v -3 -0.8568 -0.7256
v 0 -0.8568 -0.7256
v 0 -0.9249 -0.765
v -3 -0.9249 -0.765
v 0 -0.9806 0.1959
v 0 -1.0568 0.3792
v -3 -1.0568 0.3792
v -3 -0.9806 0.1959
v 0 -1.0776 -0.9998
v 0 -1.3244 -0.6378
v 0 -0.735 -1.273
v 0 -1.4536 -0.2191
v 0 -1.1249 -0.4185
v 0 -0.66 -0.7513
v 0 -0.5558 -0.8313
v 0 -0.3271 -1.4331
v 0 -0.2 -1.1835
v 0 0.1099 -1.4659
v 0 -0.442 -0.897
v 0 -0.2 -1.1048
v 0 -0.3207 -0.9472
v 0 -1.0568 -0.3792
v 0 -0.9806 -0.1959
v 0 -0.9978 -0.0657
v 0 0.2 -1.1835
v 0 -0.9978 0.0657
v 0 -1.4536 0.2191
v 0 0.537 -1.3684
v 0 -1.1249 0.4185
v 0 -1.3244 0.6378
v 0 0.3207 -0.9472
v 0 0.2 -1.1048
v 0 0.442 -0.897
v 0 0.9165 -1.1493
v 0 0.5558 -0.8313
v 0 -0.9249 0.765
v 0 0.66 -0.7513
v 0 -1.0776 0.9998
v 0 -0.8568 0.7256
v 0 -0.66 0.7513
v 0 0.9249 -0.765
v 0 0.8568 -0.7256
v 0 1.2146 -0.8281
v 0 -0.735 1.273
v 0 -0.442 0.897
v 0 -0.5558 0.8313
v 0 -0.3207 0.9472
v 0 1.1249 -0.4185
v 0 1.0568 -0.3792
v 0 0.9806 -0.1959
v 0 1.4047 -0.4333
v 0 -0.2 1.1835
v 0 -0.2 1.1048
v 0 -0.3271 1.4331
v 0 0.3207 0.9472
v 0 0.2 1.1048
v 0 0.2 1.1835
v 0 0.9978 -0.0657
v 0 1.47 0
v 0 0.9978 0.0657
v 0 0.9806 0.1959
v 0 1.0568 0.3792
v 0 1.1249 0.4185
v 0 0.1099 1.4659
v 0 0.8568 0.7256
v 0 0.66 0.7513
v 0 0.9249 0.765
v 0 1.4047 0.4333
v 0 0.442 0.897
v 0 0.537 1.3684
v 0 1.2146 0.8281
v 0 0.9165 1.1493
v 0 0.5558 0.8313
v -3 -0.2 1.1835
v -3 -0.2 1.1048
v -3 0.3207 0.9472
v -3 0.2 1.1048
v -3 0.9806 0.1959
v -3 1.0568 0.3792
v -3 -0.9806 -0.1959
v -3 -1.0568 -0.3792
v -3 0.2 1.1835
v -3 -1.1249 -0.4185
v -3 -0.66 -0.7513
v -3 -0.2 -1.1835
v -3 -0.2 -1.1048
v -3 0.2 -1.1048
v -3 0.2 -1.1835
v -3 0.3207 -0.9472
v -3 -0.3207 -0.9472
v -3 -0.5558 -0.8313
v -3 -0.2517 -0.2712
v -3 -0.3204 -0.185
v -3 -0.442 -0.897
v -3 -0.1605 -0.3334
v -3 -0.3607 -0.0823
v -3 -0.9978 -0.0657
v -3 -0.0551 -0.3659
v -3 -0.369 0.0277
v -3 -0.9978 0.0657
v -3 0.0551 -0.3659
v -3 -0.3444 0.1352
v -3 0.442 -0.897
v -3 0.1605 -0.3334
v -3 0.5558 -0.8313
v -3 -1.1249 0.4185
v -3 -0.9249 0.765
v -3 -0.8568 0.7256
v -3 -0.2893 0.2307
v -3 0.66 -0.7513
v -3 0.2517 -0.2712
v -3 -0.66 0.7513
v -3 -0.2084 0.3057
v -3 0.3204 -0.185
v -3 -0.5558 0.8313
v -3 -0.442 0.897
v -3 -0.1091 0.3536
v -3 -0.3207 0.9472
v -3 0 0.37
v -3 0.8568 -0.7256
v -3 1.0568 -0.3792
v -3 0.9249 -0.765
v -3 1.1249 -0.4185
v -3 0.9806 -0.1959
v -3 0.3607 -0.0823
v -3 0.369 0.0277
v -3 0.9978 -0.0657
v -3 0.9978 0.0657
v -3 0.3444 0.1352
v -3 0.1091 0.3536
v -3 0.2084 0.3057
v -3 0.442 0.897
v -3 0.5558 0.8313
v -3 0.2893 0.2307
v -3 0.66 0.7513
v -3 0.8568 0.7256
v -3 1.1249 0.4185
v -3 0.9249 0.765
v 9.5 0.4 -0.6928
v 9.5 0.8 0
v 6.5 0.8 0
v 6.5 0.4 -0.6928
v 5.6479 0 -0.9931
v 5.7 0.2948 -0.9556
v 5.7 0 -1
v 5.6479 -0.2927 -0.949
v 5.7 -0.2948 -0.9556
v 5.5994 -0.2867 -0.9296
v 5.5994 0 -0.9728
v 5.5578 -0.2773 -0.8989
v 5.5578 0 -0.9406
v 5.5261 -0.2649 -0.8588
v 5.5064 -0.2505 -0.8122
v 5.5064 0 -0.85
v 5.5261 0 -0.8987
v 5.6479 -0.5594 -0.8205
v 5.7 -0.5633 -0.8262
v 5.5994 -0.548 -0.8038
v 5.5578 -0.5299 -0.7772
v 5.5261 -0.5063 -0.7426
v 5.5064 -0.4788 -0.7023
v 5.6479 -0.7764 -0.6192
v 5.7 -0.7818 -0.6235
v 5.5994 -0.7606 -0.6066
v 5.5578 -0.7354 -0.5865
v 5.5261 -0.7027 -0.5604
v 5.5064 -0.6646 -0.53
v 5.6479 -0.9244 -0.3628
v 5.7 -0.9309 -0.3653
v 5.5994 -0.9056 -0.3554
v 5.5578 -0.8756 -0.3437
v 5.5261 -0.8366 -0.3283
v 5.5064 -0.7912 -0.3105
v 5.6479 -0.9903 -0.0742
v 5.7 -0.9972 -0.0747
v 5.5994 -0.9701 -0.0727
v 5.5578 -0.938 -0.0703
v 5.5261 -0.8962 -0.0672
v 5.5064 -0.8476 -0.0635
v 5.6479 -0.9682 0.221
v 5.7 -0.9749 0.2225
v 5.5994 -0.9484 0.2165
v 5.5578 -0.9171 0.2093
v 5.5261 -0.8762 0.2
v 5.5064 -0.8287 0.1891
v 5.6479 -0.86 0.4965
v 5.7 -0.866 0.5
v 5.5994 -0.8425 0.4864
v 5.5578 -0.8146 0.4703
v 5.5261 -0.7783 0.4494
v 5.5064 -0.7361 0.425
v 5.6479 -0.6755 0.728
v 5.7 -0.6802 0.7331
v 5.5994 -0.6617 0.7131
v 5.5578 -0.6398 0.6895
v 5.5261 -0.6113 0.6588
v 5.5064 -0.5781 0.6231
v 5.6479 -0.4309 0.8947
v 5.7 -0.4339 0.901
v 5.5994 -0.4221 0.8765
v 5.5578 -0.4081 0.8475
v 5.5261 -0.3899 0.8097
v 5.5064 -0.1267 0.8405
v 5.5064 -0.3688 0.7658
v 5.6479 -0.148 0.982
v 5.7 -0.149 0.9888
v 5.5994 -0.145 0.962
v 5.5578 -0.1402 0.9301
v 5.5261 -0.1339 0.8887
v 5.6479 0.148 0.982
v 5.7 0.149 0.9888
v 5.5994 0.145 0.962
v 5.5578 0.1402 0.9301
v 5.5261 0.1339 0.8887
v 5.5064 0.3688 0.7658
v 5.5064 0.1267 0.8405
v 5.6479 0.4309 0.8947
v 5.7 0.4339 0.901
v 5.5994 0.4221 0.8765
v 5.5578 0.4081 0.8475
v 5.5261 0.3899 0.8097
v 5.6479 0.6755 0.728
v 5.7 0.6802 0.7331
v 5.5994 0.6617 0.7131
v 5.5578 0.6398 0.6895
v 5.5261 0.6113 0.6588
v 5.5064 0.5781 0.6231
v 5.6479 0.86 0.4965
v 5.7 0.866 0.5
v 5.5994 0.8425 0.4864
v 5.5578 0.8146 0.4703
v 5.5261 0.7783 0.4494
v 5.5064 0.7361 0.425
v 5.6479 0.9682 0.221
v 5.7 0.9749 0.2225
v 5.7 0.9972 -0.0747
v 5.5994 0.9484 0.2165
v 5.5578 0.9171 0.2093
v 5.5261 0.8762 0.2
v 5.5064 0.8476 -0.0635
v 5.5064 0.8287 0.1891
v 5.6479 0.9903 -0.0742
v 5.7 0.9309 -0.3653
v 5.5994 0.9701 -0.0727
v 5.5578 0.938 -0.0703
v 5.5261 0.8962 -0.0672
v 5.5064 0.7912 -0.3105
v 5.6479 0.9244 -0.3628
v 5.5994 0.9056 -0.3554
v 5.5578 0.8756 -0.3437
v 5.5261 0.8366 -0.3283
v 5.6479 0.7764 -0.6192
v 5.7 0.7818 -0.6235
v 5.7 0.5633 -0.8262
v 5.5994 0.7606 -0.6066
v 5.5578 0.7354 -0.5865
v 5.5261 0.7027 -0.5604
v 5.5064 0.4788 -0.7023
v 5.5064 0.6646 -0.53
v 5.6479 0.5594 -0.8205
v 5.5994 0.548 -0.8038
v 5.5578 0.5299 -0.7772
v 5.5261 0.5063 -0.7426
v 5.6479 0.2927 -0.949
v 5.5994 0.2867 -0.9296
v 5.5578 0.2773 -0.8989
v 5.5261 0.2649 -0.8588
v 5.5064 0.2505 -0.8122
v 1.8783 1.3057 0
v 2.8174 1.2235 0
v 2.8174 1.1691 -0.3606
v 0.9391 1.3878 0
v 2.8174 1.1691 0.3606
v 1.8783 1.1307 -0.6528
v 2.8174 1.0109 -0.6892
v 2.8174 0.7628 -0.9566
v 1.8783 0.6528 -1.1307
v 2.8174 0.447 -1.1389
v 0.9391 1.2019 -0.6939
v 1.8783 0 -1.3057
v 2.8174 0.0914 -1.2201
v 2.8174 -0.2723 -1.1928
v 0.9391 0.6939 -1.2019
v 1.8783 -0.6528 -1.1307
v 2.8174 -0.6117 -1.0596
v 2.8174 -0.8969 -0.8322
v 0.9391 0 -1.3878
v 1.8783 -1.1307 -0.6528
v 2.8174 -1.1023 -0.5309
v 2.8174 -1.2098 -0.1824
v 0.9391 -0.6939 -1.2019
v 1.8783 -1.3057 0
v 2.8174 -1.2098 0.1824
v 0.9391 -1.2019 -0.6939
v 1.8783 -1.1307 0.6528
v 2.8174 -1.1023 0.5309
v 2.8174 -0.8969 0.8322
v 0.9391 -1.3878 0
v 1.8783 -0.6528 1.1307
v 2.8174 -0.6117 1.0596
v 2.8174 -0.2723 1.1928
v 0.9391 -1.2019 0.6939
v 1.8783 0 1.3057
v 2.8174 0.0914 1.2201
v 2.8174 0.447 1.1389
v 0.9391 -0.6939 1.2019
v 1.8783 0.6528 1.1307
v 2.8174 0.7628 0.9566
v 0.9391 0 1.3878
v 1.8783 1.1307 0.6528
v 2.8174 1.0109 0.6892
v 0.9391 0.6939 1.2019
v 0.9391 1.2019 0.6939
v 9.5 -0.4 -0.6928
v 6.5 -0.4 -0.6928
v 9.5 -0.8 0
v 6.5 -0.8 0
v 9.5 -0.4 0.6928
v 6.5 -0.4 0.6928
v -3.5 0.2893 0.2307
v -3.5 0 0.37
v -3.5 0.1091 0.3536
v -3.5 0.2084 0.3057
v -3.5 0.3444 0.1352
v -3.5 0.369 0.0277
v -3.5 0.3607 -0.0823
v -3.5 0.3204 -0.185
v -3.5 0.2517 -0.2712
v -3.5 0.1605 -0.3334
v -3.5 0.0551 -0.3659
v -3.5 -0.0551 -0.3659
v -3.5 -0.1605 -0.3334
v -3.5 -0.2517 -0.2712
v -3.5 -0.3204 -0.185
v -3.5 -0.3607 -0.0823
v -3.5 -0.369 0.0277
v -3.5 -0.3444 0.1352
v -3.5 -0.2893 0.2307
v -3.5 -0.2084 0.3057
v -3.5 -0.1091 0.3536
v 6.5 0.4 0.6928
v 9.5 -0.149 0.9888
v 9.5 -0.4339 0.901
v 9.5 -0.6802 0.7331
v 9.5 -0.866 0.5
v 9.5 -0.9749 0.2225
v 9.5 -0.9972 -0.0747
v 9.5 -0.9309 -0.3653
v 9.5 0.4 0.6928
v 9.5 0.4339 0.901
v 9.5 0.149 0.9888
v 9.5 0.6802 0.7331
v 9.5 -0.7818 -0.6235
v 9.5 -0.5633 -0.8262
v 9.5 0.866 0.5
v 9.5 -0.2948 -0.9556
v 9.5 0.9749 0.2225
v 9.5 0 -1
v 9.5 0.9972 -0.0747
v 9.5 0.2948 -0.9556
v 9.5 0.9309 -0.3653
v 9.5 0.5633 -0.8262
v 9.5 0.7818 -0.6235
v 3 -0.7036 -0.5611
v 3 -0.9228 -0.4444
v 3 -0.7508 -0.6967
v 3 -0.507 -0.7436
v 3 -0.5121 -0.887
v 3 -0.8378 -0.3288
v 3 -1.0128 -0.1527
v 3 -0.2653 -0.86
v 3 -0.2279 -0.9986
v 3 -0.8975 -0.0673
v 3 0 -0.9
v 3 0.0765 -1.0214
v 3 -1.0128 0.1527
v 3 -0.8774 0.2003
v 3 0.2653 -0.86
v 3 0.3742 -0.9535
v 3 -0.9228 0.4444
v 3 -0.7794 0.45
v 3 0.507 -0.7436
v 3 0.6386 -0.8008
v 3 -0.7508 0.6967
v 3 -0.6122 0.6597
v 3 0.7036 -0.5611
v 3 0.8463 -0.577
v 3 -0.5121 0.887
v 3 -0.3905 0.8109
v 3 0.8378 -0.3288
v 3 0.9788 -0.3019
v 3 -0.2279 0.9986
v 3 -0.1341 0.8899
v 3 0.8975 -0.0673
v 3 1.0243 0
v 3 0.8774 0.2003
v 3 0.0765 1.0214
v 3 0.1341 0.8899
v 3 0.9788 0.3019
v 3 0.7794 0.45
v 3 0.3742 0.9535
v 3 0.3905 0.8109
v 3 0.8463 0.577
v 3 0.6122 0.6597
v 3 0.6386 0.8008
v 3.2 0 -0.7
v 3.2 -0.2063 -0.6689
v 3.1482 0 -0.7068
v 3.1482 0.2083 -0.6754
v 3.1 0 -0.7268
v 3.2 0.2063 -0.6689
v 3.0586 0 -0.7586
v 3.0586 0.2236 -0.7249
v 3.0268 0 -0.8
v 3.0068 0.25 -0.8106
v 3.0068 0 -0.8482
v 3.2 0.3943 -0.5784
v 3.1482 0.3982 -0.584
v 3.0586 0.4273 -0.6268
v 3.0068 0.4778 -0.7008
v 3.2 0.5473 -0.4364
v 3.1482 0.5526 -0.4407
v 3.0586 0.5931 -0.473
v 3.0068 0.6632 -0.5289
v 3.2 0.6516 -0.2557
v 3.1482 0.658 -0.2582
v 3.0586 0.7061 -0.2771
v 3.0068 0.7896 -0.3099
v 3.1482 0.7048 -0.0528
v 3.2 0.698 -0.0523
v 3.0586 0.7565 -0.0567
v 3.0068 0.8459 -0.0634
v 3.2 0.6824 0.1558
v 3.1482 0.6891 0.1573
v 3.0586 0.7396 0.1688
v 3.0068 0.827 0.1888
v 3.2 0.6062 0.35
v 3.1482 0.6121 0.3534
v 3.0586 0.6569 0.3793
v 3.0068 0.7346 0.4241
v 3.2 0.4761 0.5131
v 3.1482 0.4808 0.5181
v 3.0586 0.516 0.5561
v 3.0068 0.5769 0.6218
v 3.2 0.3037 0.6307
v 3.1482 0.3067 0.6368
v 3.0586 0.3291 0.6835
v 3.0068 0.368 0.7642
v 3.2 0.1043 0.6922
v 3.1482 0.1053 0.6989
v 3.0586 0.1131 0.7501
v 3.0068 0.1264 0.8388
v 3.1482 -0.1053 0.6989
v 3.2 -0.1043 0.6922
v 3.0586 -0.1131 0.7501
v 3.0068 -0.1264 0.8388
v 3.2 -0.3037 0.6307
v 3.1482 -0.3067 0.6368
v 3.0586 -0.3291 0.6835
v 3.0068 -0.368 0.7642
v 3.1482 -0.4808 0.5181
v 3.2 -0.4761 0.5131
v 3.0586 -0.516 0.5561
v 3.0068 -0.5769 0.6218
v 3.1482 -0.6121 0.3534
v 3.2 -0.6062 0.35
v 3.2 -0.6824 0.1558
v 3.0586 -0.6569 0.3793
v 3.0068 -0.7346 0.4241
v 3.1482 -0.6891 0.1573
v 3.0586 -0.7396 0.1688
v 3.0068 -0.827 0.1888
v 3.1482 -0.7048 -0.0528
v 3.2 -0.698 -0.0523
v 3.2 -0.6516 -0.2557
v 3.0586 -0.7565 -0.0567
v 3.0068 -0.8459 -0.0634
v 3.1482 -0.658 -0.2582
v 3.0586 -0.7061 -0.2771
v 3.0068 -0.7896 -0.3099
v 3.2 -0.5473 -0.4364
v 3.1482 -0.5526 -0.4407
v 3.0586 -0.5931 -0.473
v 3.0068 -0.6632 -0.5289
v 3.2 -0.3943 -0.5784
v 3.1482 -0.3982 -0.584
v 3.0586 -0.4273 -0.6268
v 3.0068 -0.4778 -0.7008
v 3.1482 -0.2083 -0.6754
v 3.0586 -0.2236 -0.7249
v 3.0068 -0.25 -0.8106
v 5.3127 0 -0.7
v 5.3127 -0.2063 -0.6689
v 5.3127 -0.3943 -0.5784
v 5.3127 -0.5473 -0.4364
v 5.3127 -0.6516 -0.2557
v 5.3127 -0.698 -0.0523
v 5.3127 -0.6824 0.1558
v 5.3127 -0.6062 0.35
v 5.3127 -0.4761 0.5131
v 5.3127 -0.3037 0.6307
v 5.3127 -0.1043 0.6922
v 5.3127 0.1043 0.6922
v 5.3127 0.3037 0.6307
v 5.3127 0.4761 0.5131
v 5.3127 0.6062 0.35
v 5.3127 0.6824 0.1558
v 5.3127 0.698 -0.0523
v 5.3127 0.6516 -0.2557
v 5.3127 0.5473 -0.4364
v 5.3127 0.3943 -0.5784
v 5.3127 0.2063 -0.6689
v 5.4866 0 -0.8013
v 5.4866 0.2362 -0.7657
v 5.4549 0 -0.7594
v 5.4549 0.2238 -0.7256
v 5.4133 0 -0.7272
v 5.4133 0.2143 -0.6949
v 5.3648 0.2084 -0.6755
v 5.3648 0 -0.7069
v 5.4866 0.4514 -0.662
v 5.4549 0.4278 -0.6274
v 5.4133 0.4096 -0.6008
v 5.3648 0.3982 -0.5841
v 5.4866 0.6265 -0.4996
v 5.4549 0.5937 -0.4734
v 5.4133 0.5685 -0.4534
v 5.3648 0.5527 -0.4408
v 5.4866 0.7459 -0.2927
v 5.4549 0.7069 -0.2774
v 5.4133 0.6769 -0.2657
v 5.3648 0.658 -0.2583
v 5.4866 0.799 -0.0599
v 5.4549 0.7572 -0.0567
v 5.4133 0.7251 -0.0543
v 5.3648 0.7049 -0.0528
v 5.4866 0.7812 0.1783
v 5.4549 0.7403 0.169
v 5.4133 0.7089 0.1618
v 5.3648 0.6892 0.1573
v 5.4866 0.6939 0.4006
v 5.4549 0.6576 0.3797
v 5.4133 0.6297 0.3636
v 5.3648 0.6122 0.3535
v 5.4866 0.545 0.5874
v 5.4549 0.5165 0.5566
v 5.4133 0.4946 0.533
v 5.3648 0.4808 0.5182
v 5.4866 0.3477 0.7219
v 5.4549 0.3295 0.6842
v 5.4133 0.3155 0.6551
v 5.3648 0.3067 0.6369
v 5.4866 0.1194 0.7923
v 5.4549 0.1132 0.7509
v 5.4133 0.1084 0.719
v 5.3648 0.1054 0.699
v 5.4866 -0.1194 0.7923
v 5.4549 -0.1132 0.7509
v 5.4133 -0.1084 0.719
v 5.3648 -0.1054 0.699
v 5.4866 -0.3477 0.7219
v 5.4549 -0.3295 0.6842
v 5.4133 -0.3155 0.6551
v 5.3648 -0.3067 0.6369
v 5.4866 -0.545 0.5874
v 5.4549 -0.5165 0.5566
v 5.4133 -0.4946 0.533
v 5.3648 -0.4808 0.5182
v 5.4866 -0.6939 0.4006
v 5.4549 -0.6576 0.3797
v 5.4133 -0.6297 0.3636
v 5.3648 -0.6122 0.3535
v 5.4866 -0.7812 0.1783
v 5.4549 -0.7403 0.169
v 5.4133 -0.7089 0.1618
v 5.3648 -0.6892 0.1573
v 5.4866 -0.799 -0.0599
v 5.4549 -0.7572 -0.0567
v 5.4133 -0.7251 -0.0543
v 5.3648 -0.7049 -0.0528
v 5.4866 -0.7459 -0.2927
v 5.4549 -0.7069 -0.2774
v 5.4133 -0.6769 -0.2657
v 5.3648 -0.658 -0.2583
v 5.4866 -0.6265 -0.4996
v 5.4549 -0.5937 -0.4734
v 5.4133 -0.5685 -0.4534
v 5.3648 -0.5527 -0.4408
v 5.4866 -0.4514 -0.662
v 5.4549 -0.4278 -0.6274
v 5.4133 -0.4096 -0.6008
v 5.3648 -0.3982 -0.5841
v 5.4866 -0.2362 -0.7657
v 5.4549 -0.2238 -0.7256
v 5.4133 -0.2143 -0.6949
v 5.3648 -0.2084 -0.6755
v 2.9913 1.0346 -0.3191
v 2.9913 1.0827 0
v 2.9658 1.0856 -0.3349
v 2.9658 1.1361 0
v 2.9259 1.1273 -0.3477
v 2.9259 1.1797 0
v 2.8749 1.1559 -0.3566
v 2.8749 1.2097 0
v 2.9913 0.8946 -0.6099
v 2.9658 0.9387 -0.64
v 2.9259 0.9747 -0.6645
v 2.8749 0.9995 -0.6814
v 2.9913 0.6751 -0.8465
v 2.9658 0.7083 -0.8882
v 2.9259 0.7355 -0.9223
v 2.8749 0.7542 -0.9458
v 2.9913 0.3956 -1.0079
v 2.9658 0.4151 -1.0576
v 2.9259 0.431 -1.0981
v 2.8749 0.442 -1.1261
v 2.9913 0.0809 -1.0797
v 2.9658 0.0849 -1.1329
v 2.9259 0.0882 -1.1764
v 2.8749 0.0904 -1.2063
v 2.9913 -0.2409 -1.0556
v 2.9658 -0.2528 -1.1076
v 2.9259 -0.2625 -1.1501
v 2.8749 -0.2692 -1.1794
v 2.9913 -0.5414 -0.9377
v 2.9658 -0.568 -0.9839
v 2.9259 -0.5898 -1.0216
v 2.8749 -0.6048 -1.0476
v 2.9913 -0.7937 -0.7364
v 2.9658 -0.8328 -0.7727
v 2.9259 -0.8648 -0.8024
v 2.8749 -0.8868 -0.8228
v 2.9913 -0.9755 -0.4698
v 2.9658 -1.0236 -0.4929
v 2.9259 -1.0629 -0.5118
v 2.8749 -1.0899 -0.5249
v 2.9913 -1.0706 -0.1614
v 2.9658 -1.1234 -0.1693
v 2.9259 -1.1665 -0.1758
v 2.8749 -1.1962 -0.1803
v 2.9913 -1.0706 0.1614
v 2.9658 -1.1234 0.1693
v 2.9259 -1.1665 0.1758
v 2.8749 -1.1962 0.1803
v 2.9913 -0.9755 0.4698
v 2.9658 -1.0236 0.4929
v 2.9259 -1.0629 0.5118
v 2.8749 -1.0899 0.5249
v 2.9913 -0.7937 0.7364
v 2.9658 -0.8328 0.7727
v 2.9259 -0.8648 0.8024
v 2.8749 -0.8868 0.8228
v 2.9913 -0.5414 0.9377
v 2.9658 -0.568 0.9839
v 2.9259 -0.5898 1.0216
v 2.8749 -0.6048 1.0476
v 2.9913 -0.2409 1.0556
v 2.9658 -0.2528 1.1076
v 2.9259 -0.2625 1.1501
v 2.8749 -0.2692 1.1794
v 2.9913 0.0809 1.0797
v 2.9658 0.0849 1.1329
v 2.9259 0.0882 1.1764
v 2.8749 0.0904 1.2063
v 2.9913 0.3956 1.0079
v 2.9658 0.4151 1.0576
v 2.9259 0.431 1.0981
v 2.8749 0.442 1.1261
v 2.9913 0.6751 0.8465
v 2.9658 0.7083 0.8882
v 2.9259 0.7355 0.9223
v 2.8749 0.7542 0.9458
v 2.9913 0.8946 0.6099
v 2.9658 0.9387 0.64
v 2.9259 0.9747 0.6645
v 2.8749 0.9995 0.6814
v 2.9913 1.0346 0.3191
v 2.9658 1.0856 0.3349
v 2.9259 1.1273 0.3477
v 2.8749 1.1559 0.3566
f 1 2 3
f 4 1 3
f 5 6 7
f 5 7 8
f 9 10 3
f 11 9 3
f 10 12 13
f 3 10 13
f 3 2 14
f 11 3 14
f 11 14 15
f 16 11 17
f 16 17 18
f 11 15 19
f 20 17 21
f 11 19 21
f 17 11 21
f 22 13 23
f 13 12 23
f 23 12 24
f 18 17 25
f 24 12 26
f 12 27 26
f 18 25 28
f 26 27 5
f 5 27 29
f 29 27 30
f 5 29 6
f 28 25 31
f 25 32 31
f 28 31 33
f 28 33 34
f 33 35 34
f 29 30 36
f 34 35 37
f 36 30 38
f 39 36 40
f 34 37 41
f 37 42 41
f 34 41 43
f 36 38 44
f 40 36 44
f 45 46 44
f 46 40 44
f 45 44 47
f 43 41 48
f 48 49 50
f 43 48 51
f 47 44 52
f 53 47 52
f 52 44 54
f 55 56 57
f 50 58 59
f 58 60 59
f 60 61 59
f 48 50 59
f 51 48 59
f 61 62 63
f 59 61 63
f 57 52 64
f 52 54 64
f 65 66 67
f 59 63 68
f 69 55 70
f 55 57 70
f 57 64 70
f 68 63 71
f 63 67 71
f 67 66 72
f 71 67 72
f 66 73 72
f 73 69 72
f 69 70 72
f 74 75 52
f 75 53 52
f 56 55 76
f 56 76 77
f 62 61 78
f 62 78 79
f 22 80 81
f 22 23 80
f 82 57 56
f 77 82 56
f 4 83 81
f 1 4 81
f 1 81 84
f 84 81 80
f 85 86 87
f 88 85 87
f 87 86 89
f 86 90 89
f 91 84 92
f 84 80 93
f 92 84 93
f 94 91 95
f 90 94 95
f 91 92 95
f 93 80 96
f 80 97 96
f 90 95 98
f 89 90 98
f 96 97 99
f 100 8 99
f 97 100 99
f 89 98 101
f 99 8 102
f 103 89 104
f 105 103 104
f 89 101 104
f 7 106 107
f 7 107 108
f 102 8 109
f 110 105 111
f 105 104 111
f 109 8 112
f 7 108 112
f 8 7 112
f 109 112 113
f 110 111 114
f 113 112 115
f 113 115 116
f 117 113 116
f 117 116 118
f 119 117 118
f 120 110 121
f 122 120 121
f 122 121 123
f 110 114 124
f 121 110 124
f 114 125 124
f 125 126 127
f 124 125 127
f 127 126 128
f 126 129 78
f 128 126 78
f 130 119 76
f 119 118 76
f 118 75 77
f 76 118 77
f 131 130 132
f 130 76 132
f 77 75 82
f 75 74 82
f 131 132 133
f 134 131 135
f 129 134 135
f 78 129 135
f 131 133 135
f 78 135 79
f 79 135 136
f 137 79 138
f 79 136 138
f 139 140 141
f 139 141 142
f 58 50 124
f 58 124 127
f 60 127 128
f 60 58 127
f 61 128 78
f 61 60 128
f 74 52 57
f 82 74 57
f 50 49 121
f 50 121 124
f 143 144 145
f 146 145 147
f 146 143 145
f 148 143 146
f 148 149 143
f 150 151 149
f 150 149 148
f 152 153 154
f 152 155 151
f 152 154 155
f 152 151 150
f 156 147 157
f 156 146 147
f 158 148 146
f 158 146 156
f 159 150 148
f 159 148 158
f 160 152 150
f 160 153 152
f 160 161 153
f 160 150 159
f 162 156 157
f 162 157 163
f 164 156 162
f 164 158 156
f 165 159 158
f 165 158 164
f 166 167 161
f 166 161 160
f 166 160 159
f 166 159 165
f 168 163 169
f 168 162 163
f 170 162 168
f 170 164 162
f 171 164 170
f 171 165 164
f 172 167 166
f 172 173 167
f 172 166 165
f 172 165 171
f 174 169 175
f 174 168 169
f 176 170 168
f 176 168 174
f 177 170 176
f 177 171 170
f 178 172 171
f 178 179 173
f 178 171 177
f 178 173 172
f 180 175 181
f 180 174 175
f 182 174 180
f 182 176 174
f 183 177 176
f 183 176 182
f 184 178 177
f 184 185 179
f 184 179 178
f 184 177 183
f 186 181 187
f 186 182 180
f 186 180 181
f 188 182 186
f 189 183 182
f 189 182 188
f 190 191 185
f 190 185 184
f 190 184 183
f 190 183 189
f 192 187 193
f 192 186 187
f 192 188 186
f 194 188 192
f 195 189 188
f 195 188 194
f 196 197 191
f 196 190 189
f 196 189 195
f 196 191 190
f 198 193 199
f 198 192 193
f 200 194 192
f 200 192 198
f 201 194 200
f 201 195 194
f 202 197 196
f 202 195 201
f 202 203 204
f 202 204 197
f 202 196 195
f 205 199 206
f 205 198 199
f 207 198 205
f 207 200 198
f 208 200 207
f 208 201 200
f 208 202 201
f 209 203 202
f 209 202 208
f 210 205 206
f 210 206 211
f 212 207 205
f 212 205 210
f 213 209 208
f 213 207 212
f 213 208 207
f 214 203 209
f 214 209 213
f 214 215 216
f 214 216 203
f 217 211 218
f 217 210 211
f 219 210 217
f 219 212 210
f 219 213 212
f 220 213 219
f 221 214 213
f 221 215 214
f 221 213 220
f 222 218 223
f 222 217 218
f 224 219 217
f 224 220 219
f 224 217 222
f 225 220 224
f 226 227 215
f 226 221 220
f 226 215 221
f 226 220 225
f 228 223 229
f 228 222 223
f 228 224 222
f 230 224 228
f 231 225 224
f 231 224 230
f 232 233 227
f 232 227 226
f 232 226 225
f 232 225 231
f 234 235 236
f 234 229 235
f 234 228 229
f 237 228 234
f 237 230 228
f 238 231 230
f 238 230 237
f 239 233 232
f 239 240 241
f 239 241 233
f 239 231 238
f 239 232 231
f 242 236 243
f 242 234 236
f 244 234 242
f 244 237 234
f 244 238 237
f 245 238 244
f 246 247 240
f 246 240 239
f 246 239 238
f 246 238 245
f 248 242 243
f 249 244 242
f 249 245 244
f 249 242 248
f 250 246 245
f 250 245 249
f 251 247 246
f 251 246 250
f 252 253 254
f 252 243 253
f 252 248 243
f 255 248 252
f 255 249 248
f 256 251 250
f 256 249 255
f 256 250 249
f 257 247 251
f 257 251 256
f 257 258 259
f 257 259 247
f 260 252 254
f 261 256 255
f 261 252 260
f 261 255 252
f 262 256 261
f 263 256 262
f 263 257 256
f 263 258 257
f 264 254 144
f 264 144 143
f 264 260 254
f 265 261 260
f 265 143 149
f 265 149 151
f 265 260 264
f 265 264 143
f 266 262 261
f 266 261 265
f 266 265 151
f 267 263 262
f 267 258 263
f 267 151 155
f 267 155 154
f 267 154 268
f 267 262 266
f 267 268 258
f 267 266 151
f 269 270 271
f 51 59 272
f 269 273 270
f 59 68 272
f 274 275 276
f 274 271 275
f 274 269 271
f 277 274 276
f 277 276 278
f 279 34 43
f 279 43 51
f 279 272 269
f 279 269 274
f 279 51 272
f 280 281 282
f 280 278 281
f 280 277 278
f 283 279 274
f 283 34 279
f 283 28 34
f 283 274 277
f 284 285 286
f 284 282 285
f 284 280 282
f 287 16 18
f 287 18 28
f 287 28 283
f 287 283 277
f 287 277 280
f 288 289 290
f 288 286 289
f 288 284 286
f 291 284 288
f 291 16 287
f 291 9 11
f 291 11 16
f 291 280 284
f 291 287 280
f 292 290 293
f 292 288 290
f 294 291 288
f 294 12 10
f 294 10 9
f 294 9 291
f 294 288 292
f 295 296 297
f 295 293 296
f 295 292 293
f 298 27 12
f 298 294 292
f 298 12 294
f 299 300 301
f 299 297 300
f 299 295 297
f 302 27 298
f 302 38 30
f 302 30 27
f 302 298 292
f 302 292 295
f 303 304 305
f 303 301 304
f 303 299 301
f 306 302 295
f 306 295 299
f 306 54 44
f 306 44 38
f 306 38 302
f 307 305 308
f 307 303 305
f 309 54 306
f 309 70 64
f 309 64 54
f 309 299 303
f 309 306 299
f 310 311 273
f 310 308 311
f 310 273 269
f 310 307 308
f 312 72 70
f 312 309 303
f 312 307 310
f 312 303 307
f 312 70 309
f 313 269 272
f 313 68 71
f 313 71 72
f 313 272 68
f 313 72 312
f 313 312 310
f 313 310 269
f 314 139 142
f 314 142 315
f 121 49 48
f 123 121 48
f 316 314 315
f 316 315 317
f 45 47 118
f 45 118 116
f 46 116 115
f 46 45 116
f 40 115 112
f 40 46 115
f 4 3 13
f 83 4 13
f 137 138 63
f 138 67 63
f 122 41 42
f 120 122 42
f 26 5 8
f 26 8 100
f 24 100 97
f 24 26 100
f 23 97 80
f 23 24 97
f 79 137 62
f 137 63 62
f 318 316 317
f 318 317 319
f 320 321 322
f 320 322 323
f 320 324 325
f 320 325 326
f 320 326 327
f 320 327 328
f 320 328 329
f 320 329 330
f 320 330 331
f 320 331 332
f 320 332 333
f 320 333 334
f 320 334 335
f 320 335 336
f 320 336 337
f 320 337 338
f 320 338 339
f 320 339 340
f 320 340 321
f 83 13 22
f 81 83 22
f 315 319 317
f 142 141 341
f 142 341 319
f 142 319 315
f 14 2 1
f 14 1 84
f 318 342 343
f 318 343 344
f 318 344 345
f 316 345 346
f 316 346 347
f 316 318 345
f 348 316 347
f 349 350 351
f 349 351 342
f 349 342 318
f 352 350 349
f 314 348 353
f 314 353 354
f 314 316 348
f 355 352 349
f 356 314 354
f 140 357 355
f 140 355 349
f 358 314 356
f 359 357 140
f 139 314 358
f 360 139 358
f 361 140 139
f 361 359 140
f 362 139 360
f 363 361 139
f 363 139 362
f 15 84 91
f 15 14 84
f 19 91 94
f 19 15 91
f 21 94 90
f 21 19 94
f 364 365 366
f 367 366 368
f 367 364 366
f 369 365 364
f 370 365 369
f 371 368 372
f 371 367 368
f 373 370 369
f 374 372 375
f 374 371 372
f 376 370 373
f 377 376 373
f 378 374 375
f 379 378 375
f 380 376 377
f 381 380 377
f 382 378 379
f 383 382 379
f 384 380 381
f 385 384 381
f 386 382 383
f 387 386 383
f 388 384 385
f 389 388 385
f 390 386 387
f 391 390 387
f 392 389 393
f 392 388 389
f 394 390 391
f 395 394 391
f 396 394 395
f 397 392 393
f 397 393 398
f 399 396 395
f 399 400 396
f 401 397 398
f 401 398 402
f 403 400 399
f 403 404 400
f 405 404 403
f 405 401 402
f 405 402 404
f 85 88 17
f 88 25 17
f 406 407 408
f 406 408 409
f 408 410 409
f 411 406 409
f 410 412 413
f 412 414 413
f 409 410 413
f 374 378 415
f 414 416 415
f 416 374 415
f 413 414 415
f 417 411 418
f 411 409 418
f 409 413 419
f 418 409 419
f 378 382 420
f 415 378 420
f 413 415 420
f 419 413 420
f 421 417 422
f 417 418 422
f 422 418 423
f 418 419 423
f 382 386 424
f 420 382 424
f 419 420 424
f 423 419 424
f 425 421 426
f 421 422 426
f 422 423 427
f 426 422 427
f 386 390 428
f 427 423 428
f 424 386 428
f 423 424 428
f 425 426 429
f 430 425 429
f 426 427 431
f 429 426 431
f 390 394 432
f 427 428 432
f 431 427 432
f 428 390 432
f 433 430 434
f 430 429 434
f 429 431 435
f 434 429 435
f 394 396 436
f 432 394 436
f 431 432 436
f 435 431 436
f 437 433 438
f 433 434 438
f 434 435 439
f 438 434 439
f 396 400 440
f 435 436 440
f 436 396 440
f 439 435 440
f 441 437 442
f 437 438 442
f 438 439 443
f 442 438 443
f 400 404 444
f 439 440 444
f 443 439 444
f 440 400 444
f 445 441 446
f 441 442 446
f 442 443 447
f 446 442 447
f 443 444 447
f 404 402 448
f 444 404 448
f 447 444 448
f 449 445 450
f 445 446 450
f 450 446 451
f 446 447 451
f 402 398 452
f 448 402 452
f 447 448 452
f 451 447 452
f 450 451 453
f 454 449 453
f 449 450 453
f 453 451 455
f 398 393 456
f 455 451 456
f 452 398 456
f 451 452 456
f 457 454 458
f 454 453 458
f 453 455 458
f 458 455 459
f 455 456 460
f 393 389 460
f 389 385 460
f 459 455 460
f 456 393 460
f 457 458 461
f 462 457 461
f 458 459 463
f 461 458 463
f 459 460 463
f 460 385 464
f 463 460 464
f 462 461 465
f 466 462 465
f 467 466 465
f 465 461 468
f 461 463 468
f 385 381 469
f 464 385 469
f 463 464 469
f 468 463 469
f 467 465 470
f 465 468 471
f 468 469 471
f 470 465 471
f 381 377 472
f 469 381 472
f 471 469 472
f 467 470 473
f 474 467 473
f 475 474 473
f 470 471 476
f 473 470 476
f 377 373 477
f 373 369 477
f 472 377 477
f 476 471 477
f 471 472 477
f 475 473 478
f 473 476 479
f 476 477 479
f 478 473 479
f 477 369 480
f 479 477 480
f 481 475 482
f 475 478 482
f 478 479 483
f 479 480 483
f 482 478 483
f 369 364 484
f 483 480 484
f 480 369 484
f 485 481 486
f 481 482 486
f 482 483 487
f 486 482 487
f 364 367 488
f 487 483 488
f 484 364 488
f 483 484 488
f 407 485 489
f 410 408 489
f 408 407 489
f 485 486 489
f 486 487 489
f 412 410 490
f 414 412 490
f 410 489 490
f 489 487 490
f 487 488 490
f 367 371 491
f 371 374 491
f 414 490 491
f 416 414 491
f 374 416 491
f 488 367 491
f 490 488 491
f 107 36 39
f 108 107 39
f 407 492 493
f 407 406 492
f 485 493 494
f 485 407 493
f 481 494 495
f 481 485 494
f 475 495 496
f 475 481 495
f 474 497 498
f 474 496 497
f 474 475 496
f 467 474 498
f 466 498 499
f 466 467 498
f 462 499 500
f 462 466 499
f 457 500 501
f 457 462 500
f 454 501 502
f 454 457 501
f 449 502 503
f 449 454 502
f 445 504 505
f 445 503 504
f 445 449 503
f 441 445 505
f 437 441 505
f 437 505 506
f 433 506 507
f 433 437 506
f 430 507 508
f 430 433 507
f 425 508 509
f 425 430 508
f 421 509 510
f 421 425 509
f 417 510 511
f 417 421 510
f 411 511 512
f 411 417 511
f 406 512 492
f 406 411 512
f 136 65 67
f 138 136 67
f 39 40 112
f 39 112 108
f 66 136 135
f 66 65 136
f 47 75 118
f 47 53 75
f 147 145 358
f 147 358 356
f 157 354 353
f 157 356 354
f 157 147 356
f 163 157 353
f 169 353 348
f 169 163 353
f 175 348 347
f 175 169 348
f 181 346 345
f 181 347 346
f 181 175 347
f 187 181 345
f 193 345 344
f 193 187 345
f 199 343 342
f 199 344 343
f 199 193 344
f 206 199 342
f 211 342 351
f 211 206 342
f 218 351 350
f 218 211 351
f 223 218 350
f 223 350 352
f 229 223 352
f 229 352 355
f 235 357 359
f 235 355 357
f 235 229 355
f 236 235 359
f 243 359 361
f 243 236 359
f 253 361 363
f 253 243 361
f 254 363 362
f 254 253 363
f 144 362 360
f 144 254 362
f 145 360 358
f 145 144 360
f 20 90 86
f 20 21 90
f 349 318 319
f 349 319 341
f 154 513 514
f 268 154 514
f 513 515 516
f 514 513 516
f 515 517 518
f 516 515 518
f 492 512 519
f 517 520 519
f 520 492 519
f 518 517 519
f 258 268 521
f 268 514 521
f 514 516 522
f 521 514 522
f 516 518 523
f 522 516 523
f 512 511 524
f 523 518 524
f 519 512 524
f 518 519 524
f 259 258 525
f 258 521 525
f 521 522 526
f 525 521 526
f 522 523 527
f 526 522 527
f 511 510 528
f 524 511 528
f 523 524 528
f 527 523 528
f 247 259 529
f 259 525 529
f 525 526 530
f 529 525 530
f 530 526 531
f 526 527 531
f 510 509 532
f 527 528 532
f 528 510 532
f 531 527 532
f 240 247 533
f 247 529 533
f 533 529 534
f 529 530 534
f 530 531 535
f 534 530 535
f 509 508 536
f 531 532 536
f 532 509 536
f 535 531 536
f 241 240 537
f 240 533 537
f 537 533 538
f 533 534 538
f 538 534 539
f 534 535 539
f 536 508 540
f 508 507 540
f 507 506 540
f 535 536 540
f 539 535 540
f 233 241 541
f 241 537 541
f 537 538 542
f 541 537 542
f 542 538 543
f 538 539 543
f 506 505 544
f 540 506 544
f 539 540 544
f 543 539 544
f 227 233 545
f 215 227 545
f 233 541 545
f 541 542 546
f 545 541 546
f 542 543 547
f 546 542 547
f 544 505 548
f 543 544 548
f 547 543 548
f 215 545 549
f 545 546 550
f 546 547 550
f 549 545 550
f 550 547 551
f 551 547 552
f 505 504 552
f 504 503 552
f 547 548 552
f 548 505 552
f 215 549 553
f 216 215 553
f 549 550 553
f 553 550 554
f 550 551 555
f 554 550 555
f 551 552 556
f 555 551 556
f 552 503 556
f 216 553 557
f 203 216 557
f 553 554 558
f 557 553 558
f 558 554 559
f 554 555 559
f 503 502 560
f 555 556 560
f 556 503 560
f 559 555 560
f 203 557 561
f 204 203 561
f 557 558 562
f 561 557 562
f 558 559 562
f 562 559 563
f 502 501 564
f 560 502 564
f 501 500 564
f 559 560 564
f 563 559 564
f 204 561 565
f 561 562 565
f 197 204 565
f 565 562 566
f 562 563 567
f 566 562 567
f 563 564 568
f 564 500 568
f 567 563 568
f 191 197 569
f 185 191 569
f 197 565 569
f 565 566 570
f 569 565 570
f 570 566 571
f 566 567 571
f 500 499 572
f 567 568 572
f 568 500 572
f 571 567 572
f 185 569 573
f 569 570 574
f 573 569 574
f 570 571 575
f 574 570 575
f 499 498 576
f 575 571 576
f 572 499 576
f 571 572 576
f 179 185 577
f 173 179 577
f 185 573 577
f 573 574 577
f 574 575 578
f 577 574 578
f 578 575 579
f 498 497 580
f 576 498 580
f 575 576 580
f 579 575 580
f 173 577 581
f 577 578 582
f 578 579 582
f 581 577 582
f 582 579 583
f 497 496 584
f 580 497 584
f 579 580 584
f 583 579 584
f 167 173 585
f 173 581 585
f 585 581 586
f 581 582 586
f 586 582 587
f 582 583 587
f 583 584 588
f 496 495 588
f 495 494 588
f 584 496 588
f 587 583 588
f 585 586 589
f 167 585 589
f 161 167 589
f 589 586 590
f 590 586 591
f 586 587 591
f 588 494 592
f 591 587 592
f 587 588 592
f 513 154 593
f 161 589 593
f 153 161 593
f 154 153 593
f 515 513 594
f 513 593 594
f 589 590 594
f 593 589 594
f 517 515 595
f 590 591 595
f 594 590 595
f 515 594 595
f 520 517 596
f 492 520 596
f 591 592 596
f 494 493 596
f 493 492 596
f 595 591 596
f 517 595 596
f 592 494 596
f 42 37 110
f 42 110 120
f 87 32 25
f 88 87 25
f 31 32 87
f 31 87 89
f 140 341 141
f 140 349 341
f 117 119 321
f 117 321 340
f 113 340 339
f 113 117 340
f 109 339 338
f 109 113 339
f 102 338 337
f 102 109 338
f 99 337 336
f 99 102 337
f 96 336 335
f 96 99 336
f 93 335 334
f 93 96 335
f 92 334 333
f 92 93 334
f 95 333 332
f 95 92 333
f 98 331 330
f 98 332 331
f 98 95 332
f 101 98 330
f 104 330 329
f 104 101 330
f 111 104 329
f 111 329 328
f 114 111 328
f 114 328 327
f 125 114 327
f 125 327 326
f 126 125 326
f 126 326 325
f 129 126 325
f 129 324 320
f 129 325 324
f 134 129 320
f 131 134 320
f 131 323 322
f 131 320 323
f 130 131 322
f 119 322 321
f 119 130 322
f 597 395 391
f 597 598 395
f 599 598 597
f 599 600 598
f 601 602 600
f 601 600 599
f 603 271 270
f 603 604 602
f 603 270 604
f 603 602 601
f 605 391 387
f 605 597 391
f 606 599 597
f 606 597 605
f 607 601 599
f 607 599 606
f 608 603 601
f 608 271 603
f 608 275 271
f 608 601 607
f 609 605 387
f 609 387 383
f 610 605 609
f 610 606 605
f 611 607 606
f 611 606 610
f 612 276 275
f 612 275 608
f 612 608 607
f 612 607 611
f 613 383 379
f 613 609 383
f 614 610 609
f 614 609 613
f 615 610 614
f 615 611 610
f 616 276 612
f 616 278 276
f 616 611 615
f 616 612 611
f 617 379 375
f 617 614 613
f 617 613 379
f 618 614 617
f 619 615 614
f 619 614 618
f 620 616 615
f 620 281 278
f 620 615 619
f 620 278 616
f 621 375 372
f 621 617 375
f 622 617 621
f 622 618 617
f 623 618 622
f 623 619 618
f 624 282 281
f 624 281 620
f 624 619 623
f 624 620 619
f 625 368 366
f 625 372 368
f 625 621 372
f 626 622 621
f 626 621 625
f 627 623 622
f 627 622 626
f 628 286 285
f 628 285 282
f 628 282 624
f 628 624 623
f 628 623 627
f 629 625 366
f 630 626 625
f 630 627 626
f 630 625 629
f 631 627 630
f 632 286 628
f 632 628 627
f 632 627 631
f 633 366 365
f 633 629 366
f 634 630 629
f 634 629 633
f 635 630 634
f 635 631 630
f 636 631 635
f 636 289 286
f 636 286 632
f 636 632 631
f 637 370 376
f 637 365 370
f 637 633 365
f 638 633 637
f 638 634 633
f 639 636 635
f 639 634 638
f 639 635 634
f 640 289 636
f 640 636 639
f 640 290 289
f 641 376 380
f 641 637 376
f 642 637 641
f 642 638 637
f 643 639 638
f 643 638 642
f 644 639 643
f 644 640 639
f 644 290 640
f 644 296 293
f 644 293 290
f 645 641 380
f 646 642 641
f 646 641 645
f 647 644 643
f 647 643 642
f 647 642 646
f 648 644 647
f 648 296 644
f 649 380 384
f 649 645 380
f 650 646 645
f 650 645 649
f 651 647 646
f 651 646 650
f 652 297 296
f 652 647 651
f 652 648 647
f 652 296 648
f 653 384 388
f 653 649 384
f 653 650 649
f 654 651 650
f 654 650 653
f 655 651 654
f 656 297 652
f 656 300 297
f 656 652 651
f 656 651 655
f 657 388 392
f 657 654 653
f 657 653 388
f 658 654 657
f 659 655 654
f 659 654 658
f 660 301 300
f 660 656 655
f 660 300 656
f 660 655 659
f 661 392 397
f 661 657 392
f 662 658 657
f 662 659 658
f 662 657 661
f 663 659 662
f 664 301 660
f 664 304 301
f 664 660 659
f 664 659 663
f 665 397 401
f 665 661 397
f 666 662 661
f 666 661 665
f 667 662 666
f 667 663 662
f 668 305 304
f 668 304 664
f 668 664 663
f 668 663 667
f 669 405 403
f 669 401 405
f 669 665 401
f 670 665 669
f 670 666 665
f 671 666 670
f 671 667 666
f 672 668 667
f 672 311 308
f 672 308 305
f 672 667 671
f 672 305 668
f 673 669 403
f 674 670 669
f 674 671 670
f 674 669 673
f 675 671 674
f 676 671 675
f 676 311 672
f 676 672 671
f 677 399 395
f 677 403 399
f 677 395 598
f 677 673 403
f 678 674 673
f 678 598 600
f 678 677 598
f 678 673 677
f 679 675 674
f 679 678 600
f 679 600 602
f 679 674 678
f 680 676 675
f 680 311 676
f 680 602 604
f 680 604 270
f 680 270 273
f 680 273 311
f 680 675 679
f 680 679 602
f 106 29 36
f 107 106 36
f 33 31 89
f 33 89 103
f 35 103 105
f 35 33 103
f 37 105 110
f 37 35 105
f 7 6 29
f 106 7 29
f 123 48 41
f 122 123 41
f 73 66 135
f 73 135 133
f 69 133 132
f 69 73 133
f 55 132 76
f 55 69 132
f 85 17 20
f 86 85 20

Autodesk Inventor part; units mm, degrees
ref_plane "YZ Plane" through (0, 0, 0) normal (1, 0, 0) x (0, 1, 0)
ref_plane "XZ Plane" through (0, 0, 0) normal (0, 1, 0) x (-1, 0, 0)
ref_plane "XY Plane" through (0, 0, 0) normal (0, 0, 1) x (1, 0, 0)
sketch "Sketch1" plane through (0, 0, 0) normal (1, 0, 0) x (0, 1, 0)
  line L0 (1.056781, -0.379193) -> (0.980627, -0.195884)
  line L1 (1.056781, -0.379193) -> (1.12494, -0.418544)
  line L2 (1.12494, -0.418544) -> (0.92494, -0.764955)
  line L3 (0.92494, -0.764955) -> (0.856781, -0.725603)
  line L4 (0.659954, -0.751306) -> (0.856781, -0.725603)
  arc A0 (0.320673, -0.94719) -> (0.659954, -0.751306) centre (0, 0) ccw
  line L5 (0.2, -1.104796) -> (0.320673, -0.94719)
  line L6 (0.2, -1.104796) -> (0.2, -1.183499)
  line L7 (0.2, -1.183499) -> (-0.2, -1.183499)
  line L8 (-0.2, -1.183499) -> (-0.2, -1.104796)
  line L9 (-0.320673, -0.94719) -> (-0.2, -1.104796)
  arc A1 (-0.659954, -0.751306) -> (-0.320673, -0.94719) centre (0, 0) ccw
  line L10 (-0.856781, -0.725603) -> (-0.659954, -0.751306)
  line L11 (-0.856781, -0.725603) -> (-0.92494, -0.764955)
  line L12 (-0.92494, -0.764955) -> (-1.12494, -0.418544)
  line L13 (-1.12494, -0.418544) -> (-1.056781, -0.379193)
  line L14 (-0.980627, -0.195884) -> (-1.056781, -0.379193)
  arc A2 (-0.980627, 0.195884) -> (-0.980627, -0.195884) centre (0, 0) ccw
  line L15 (-1.056781, 0.379193) -> (-0.980627, 0.195884)
  line L16 (-1.056781, 0.379193) -> (-1.12494, 0.418544)
  line L17 (-1.12494, 0.418544) -> (-0.92494, 0.764955)
  line L18 (-0.92494, 0.764955) -> (-0.856781, 0.725603)
  line L19 (-0.659954, 0.751306) -> (-0.856781, 0.725603)
  arc A3 (-0.320673, 0.94719) -> (-0.659954, 0.751306) centre (0, 0) ccw
  line L20 (-0.2, 1.104796) -> (-0.320673, 0.94719)
  line L21 (-0.2, 1.104796) -> (-0.2, 1.183499)
  line L22 (-0.2, 1.183499) -> (0.2, 1.183499)
  line L23 (0.2, 1.183499) -> (0.2, 1.104796)
  line L24 (0.320673, 0.94719) -> (0.2, 1.104796)
  arc A4 (0.659954, 0.751306) -> (0.320673, 0.94719) centre (0, 0) ccw
  line L25 (0.856781, 0.725603) -> (0.659954, 0.751306)
  line L26 (0.856781, 0.725603) -> (0.92494, 0.764955)
  line L27 (0.92494, 0.764955) -> (1.12494, 0.418544)
  line L28 (1.12494, 0.418544) -> (1.056781, 0.379193)
  line L29 (0.980627, 0.195884) -> (1.056781, 0.379193)
  arc A5 (0.980627, -0.195884) -> (0.980627, 0.195884) centre (0, 0) ccw
  circle A6 centre (0, 0) radius 1.469987
  point P0 (0, 0)
extrude "Extrusion1" add sketch "Sketch1" against normal blind 3 contours L1 L2 L3 L4 A0 L5 L6 L7 L8 L9 A1 L10 L11 L12 L13 L14 A2 L15 L16 L17 L18 L19 A3 L20 L21 L22 L23 L24 A4 L25 L26 L27 L28 L29 A5 L0
sketch "Sketch1 outline for Extrusion2" plane through (0, 0, 0) normal (1, 0, 0) x (0, 1, 0)
  circle A0 centre (0, 0) radius 1.469987
extrude "Extrusion2" add sketch "Sketch1 outline for Extrusion2" along normal blind 3 draft -5
sketch "Sketch2" plane through (3, 0, 0) normal (1, 0, 0) x (0, 0, -1)
  circle A0 centre (0, 0) radius 0.7
  dimension "d6" = 1.4
extrude "Extrusion3" add sketch "Sketch2" along normal blind 2.5
sketch "Sketch3" plane through (5.5, 0, 0) normal (1, 0, 0) x (0, 0, -1)
  circle A0 centre (0, 0) radius 1
  dimension "d7" = 2
extrude "Extrusion4" add sketch "Sketch3" along normal blind 4
sketch "Sketch4" plane through (9.5, 0, 0) normal (1, 0, 0) x (0, 0, -1)
  circle A0 centre (0, 0) radius 0.8
  line L0 (0, -0.8) -> (-0.69282, -0.4)
  line L1 (-0.69282, -0.4) -> (-0.69282, 0.4)
  line L2 (-0.69282, 0.4) -> (0, 0.8)
  line L3 (0, 0.8) -> (0.69282, 0.4)
  line L4 (0.69282, 0.4) -> (0.69282, -0.4)
  line L5 (0.69282, -0.4) -> (0, -0.8)
  dimension "d10" = 1.6
extrude "Extrusion5" cut sketch "Sketch4" against normal blind 3 contours L4 L5 L0 L1 L2 L3
fillet "Fillet1" radius 0.2 4 edges at (5.5, 0, 1) (3, -1.2075, 0) (3, 0, 0.7) (5.5, 0, 0.7)
sketch "Sketch5" plane through (-3, 0, 0) normal (-1, 0, 0) x (0, 0, 1)
  circle A0 centre (0, 0) radius 0.37
  dimension "d14" = 0.74
extrude "Extrusion6" add sketch "Sketch5" along normal blind 0.5
thread "Thread1" size "M0.8x0.2" class "6g" standard "ANSI Metric M Profile" full length
properties part number "lagnut_screw" material "Steel"
